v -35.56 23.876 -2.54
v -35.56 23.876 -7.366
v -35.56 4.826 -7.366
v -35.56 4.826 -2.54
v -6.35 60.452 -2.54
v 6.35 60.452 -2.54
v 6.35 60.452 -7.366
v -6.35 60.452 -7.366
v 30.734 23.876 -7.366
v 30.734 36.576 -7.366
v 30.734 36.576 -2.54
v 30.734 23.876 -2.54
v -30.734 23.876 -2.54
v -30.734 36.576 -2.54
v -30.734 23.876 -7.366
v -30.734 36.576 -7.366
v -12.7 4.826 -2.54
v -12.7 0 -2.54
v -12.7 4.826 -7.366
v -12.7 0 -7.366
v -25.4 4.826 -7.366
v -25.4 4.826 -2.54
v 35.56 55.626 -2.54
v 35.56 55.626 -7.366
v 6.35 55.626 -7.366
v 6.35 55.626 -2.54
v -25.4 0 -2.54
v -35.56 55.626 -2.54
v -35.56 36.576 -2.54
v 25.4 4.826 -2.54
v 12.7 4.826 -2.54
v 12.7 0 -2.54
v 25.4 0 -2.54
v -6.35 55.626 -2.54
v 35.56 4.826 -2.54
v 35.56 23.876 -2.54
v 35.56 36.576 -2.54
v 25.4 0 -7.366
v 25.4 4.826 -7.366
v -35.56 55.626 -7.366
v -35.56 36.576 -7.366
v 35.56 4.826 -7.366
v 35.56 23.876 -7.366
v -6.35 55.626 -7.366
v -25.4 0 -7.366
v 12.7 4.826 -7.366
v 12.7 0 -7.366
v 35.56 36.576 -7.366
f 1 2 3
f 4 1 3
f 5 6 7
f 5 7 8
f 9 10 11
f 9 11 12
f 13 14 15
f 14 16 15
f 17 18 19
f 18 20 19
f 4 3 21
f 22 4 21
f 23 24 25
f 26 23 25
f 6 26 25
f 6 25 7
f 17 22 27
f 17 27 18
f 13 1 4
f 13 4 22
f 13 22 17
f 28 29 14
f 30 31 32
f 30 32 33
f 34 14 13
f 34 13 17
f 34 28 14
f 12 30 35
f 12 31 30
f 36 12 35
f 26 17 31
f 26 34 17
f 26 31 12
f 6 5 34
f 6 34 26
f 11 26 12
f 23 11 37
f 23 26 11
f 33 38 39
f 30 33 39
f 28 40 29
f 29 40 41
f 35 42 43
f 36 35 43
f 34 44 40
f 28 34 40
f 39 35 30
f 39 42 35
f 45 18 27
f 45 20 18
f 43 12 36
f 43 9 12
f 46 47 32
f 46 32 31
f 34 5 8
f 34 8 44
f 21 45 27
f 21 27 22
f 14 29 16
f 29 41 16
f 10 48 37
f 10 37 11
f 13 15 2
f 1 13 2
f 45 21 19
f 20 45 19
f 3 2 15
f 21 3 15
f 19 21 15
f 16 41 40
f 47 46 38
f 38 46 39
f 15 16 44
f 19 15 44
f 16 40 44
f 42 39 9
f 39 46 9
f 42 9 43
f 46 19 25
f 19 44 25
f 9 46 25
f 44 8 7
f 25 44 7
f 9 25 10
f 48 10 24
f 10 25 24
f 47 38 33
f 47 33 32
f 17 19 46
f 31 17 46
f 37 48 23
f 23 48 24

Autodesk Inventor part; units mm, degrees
ref_plane "YZ Plane" through (0, 0, 0) normal (1, 0, 0) x (0, 1, 0)
ref_plane "XZ Plane" through (0, 0, 0) normal (0, 1, 0) x (-1, 0, 0)
ref_plane "XY Plane" through (0, 0, 0) normal (0, 0, 1) x (1, 0, 0)
sketch "Sketch1" plane through (0, 0, 0) normal (0, 0, 1) x (1, 0, 0)
  line L0 (-34.925, 0) -> (34.925, 0) projected
  line L1 (-34.925, 4.826) -> (34.925, 4.826) projected
  line L2 (-25.4, 0) -> (-12.7, 0) projected
  line L3 (-25.4, 0) -> (-25.4, 4.826) projected
  line L4 (-12.7, 4.826) -> (-25.4, 4.826) projected
  line L5 (-12.7, 0) -> (-12.7, 4.826) projected
  line L6 (12.7, 0) -> (25.4, 0) projected
  line L7 (12.7, 0) -> (12.7, 4.826) projected
  line L8 (25.4, 4.826) -> (12.7, 4.826) projected
  line L9 (25.4, 0) -> (25.4, 4.826) projected
  line L10 (-34.925, 0) -> (-34.925, 4.826) projected
  line L11 (34.925, 4.826) -> (34.925, 0) projected
  point P0 (0, 0)
ref_plane "Work Plane1" through (-12.7, 0, -7.366) normal (0, 0, 1) x (1, 0, 0)
sketch "Sketch2" plane through (-12.7, 0, -7.366) normal (0, 0, 1) x (1, 0, 0)
  line L0 (0, 0) -> (-12.7, 0) projected
  line L1 (0, 0) -> (0, 4.826) projected
  line L2 (-12.7, 4.826) -> (0, 4.826) projected
  line L3 (-12.7, 0) -> (-12.7, 4.826) projected
  line L4 (-12.7, 0) -> (0, 0)
  line L5 (0, 0) -> (0, 4.826)
  line L6 (-12.7, 4.826) -> (-12.7, 0)
  line L7 (38.1, 0) -> (25.4, 0) projected
  line L8 (38.1, 0) -> (38.1, 4.826) projected
  line L9 (25.4, 4.826) -> (38.1, 4.826) projected
  line L10 (25.4, 0) -> (25.4, 4.826) projected
  line L11 (25.4, 0) -> (38.1, 0)
  line L12 (38.1, 0) -> (38.1, 4.826)
  line L13 (25.4, 4.826) -> (25.4, 0)
  line L14 (-18.034, 0) -> (-22.86, 0) projected
  line L15 (-18.034, 0) -> (-18.034, 4.826) projected
  line L16 (-22.86, 4.826) -> (-18.034, 4.826) projected
  line L17 (-22.86, 0) -> (-22.86, 4.826) projected
  line L18 (43.434, 0) -> (48.26, 0) projected
  line L19 (43.434, 0) -> (43.434, 4.826) projected
  line L20 (48.26, 4.826) -> (43.434, 4.826) projected
  line L21 (48.26, 0) -> (48.26, 4.826) projected
  line L22 (48.26, 55.626) -> (-22.86, 55.626)
  line L23 (-22.86, 36.576) -> (-18.034, 36.576)
  line L24 (-18.034, 36.576) -> (-18.034, 23.876)
  line L25 (-18.034, 23.876) -> (-22.86, 23.876)
  line L26 (48.26, 36.576) -> (43.434, 36.576)
  line L27 (43.434, 36.576) -> (43.434, 23.876)
  line L28 (43.434, 23.876) -> (48.26, 23.876)
  line L29 (-22.86, 55.626) -> (-22.86, 36.576)
  line L30 (-22.86, 23.876) -> (-22.86, 4.826)
  line L31 (48.26, 4.826) -> (48.26, 23.876)
  line L32 (48.26, 36.576) -> (48.26, 55.626)
  line L33 (-22.86, 4.826) -> (-12.7, 4.826)
  line L34 (0, 4.826) -> (25.4, 4.826)
  line L35 (38.1, 4.826) -> (48.26, 4.826)
  point P0 (12.7, 0)
  dimension "d0" = 50.8
  dimension "d2" = 12.7
  dimension "d5" = 4.826
  dimension "d13" = 19.05
  dimension "d14" = 19.05
  dimension "d15" = 12.7
extrude "Extrusion1" add sketch "Sketch2" along normal blind 4.826 contours L0 L3 L2 L1 | L2 L33 L16 L30 L25 L24 L23 L29 L22 L32 L26 L27 L28 L31 L20 L35 L9 L34 | L9 L8 L7 L10
sketch "Sketch3" plane through (-12.7, 0, -2.54) normal (0, 0, 1) x (1, 0, 0)
  line L0 (48.26, 55.626) -> (-22.86, 55.626) projected
  line L1 (-22.86, 55.626) -> (-22.86, 36.576) projected
  line L2 (48.26, 55.626) -> (-22.86, 55.626) projected
  line L3 (6.35, 55.626) -> (19.05, 55.626)
  line L4 (19.05, 55.626) -> (19.05, 60.452)
  line L5 (19.05, 60.452) -> (6.35, 60.452)
  line L6 (6.35, 60.452) -> (6.35, 55.626)
  point P0 (12.7, 0)
  dimension "d8" = 12.7
  dimension "d9" = 4.826
  dimension "d10" = 29.21
extrude "Extrusion2" add sketch "Sketch3" against normal blind 4.826
properties part number "sideL"
